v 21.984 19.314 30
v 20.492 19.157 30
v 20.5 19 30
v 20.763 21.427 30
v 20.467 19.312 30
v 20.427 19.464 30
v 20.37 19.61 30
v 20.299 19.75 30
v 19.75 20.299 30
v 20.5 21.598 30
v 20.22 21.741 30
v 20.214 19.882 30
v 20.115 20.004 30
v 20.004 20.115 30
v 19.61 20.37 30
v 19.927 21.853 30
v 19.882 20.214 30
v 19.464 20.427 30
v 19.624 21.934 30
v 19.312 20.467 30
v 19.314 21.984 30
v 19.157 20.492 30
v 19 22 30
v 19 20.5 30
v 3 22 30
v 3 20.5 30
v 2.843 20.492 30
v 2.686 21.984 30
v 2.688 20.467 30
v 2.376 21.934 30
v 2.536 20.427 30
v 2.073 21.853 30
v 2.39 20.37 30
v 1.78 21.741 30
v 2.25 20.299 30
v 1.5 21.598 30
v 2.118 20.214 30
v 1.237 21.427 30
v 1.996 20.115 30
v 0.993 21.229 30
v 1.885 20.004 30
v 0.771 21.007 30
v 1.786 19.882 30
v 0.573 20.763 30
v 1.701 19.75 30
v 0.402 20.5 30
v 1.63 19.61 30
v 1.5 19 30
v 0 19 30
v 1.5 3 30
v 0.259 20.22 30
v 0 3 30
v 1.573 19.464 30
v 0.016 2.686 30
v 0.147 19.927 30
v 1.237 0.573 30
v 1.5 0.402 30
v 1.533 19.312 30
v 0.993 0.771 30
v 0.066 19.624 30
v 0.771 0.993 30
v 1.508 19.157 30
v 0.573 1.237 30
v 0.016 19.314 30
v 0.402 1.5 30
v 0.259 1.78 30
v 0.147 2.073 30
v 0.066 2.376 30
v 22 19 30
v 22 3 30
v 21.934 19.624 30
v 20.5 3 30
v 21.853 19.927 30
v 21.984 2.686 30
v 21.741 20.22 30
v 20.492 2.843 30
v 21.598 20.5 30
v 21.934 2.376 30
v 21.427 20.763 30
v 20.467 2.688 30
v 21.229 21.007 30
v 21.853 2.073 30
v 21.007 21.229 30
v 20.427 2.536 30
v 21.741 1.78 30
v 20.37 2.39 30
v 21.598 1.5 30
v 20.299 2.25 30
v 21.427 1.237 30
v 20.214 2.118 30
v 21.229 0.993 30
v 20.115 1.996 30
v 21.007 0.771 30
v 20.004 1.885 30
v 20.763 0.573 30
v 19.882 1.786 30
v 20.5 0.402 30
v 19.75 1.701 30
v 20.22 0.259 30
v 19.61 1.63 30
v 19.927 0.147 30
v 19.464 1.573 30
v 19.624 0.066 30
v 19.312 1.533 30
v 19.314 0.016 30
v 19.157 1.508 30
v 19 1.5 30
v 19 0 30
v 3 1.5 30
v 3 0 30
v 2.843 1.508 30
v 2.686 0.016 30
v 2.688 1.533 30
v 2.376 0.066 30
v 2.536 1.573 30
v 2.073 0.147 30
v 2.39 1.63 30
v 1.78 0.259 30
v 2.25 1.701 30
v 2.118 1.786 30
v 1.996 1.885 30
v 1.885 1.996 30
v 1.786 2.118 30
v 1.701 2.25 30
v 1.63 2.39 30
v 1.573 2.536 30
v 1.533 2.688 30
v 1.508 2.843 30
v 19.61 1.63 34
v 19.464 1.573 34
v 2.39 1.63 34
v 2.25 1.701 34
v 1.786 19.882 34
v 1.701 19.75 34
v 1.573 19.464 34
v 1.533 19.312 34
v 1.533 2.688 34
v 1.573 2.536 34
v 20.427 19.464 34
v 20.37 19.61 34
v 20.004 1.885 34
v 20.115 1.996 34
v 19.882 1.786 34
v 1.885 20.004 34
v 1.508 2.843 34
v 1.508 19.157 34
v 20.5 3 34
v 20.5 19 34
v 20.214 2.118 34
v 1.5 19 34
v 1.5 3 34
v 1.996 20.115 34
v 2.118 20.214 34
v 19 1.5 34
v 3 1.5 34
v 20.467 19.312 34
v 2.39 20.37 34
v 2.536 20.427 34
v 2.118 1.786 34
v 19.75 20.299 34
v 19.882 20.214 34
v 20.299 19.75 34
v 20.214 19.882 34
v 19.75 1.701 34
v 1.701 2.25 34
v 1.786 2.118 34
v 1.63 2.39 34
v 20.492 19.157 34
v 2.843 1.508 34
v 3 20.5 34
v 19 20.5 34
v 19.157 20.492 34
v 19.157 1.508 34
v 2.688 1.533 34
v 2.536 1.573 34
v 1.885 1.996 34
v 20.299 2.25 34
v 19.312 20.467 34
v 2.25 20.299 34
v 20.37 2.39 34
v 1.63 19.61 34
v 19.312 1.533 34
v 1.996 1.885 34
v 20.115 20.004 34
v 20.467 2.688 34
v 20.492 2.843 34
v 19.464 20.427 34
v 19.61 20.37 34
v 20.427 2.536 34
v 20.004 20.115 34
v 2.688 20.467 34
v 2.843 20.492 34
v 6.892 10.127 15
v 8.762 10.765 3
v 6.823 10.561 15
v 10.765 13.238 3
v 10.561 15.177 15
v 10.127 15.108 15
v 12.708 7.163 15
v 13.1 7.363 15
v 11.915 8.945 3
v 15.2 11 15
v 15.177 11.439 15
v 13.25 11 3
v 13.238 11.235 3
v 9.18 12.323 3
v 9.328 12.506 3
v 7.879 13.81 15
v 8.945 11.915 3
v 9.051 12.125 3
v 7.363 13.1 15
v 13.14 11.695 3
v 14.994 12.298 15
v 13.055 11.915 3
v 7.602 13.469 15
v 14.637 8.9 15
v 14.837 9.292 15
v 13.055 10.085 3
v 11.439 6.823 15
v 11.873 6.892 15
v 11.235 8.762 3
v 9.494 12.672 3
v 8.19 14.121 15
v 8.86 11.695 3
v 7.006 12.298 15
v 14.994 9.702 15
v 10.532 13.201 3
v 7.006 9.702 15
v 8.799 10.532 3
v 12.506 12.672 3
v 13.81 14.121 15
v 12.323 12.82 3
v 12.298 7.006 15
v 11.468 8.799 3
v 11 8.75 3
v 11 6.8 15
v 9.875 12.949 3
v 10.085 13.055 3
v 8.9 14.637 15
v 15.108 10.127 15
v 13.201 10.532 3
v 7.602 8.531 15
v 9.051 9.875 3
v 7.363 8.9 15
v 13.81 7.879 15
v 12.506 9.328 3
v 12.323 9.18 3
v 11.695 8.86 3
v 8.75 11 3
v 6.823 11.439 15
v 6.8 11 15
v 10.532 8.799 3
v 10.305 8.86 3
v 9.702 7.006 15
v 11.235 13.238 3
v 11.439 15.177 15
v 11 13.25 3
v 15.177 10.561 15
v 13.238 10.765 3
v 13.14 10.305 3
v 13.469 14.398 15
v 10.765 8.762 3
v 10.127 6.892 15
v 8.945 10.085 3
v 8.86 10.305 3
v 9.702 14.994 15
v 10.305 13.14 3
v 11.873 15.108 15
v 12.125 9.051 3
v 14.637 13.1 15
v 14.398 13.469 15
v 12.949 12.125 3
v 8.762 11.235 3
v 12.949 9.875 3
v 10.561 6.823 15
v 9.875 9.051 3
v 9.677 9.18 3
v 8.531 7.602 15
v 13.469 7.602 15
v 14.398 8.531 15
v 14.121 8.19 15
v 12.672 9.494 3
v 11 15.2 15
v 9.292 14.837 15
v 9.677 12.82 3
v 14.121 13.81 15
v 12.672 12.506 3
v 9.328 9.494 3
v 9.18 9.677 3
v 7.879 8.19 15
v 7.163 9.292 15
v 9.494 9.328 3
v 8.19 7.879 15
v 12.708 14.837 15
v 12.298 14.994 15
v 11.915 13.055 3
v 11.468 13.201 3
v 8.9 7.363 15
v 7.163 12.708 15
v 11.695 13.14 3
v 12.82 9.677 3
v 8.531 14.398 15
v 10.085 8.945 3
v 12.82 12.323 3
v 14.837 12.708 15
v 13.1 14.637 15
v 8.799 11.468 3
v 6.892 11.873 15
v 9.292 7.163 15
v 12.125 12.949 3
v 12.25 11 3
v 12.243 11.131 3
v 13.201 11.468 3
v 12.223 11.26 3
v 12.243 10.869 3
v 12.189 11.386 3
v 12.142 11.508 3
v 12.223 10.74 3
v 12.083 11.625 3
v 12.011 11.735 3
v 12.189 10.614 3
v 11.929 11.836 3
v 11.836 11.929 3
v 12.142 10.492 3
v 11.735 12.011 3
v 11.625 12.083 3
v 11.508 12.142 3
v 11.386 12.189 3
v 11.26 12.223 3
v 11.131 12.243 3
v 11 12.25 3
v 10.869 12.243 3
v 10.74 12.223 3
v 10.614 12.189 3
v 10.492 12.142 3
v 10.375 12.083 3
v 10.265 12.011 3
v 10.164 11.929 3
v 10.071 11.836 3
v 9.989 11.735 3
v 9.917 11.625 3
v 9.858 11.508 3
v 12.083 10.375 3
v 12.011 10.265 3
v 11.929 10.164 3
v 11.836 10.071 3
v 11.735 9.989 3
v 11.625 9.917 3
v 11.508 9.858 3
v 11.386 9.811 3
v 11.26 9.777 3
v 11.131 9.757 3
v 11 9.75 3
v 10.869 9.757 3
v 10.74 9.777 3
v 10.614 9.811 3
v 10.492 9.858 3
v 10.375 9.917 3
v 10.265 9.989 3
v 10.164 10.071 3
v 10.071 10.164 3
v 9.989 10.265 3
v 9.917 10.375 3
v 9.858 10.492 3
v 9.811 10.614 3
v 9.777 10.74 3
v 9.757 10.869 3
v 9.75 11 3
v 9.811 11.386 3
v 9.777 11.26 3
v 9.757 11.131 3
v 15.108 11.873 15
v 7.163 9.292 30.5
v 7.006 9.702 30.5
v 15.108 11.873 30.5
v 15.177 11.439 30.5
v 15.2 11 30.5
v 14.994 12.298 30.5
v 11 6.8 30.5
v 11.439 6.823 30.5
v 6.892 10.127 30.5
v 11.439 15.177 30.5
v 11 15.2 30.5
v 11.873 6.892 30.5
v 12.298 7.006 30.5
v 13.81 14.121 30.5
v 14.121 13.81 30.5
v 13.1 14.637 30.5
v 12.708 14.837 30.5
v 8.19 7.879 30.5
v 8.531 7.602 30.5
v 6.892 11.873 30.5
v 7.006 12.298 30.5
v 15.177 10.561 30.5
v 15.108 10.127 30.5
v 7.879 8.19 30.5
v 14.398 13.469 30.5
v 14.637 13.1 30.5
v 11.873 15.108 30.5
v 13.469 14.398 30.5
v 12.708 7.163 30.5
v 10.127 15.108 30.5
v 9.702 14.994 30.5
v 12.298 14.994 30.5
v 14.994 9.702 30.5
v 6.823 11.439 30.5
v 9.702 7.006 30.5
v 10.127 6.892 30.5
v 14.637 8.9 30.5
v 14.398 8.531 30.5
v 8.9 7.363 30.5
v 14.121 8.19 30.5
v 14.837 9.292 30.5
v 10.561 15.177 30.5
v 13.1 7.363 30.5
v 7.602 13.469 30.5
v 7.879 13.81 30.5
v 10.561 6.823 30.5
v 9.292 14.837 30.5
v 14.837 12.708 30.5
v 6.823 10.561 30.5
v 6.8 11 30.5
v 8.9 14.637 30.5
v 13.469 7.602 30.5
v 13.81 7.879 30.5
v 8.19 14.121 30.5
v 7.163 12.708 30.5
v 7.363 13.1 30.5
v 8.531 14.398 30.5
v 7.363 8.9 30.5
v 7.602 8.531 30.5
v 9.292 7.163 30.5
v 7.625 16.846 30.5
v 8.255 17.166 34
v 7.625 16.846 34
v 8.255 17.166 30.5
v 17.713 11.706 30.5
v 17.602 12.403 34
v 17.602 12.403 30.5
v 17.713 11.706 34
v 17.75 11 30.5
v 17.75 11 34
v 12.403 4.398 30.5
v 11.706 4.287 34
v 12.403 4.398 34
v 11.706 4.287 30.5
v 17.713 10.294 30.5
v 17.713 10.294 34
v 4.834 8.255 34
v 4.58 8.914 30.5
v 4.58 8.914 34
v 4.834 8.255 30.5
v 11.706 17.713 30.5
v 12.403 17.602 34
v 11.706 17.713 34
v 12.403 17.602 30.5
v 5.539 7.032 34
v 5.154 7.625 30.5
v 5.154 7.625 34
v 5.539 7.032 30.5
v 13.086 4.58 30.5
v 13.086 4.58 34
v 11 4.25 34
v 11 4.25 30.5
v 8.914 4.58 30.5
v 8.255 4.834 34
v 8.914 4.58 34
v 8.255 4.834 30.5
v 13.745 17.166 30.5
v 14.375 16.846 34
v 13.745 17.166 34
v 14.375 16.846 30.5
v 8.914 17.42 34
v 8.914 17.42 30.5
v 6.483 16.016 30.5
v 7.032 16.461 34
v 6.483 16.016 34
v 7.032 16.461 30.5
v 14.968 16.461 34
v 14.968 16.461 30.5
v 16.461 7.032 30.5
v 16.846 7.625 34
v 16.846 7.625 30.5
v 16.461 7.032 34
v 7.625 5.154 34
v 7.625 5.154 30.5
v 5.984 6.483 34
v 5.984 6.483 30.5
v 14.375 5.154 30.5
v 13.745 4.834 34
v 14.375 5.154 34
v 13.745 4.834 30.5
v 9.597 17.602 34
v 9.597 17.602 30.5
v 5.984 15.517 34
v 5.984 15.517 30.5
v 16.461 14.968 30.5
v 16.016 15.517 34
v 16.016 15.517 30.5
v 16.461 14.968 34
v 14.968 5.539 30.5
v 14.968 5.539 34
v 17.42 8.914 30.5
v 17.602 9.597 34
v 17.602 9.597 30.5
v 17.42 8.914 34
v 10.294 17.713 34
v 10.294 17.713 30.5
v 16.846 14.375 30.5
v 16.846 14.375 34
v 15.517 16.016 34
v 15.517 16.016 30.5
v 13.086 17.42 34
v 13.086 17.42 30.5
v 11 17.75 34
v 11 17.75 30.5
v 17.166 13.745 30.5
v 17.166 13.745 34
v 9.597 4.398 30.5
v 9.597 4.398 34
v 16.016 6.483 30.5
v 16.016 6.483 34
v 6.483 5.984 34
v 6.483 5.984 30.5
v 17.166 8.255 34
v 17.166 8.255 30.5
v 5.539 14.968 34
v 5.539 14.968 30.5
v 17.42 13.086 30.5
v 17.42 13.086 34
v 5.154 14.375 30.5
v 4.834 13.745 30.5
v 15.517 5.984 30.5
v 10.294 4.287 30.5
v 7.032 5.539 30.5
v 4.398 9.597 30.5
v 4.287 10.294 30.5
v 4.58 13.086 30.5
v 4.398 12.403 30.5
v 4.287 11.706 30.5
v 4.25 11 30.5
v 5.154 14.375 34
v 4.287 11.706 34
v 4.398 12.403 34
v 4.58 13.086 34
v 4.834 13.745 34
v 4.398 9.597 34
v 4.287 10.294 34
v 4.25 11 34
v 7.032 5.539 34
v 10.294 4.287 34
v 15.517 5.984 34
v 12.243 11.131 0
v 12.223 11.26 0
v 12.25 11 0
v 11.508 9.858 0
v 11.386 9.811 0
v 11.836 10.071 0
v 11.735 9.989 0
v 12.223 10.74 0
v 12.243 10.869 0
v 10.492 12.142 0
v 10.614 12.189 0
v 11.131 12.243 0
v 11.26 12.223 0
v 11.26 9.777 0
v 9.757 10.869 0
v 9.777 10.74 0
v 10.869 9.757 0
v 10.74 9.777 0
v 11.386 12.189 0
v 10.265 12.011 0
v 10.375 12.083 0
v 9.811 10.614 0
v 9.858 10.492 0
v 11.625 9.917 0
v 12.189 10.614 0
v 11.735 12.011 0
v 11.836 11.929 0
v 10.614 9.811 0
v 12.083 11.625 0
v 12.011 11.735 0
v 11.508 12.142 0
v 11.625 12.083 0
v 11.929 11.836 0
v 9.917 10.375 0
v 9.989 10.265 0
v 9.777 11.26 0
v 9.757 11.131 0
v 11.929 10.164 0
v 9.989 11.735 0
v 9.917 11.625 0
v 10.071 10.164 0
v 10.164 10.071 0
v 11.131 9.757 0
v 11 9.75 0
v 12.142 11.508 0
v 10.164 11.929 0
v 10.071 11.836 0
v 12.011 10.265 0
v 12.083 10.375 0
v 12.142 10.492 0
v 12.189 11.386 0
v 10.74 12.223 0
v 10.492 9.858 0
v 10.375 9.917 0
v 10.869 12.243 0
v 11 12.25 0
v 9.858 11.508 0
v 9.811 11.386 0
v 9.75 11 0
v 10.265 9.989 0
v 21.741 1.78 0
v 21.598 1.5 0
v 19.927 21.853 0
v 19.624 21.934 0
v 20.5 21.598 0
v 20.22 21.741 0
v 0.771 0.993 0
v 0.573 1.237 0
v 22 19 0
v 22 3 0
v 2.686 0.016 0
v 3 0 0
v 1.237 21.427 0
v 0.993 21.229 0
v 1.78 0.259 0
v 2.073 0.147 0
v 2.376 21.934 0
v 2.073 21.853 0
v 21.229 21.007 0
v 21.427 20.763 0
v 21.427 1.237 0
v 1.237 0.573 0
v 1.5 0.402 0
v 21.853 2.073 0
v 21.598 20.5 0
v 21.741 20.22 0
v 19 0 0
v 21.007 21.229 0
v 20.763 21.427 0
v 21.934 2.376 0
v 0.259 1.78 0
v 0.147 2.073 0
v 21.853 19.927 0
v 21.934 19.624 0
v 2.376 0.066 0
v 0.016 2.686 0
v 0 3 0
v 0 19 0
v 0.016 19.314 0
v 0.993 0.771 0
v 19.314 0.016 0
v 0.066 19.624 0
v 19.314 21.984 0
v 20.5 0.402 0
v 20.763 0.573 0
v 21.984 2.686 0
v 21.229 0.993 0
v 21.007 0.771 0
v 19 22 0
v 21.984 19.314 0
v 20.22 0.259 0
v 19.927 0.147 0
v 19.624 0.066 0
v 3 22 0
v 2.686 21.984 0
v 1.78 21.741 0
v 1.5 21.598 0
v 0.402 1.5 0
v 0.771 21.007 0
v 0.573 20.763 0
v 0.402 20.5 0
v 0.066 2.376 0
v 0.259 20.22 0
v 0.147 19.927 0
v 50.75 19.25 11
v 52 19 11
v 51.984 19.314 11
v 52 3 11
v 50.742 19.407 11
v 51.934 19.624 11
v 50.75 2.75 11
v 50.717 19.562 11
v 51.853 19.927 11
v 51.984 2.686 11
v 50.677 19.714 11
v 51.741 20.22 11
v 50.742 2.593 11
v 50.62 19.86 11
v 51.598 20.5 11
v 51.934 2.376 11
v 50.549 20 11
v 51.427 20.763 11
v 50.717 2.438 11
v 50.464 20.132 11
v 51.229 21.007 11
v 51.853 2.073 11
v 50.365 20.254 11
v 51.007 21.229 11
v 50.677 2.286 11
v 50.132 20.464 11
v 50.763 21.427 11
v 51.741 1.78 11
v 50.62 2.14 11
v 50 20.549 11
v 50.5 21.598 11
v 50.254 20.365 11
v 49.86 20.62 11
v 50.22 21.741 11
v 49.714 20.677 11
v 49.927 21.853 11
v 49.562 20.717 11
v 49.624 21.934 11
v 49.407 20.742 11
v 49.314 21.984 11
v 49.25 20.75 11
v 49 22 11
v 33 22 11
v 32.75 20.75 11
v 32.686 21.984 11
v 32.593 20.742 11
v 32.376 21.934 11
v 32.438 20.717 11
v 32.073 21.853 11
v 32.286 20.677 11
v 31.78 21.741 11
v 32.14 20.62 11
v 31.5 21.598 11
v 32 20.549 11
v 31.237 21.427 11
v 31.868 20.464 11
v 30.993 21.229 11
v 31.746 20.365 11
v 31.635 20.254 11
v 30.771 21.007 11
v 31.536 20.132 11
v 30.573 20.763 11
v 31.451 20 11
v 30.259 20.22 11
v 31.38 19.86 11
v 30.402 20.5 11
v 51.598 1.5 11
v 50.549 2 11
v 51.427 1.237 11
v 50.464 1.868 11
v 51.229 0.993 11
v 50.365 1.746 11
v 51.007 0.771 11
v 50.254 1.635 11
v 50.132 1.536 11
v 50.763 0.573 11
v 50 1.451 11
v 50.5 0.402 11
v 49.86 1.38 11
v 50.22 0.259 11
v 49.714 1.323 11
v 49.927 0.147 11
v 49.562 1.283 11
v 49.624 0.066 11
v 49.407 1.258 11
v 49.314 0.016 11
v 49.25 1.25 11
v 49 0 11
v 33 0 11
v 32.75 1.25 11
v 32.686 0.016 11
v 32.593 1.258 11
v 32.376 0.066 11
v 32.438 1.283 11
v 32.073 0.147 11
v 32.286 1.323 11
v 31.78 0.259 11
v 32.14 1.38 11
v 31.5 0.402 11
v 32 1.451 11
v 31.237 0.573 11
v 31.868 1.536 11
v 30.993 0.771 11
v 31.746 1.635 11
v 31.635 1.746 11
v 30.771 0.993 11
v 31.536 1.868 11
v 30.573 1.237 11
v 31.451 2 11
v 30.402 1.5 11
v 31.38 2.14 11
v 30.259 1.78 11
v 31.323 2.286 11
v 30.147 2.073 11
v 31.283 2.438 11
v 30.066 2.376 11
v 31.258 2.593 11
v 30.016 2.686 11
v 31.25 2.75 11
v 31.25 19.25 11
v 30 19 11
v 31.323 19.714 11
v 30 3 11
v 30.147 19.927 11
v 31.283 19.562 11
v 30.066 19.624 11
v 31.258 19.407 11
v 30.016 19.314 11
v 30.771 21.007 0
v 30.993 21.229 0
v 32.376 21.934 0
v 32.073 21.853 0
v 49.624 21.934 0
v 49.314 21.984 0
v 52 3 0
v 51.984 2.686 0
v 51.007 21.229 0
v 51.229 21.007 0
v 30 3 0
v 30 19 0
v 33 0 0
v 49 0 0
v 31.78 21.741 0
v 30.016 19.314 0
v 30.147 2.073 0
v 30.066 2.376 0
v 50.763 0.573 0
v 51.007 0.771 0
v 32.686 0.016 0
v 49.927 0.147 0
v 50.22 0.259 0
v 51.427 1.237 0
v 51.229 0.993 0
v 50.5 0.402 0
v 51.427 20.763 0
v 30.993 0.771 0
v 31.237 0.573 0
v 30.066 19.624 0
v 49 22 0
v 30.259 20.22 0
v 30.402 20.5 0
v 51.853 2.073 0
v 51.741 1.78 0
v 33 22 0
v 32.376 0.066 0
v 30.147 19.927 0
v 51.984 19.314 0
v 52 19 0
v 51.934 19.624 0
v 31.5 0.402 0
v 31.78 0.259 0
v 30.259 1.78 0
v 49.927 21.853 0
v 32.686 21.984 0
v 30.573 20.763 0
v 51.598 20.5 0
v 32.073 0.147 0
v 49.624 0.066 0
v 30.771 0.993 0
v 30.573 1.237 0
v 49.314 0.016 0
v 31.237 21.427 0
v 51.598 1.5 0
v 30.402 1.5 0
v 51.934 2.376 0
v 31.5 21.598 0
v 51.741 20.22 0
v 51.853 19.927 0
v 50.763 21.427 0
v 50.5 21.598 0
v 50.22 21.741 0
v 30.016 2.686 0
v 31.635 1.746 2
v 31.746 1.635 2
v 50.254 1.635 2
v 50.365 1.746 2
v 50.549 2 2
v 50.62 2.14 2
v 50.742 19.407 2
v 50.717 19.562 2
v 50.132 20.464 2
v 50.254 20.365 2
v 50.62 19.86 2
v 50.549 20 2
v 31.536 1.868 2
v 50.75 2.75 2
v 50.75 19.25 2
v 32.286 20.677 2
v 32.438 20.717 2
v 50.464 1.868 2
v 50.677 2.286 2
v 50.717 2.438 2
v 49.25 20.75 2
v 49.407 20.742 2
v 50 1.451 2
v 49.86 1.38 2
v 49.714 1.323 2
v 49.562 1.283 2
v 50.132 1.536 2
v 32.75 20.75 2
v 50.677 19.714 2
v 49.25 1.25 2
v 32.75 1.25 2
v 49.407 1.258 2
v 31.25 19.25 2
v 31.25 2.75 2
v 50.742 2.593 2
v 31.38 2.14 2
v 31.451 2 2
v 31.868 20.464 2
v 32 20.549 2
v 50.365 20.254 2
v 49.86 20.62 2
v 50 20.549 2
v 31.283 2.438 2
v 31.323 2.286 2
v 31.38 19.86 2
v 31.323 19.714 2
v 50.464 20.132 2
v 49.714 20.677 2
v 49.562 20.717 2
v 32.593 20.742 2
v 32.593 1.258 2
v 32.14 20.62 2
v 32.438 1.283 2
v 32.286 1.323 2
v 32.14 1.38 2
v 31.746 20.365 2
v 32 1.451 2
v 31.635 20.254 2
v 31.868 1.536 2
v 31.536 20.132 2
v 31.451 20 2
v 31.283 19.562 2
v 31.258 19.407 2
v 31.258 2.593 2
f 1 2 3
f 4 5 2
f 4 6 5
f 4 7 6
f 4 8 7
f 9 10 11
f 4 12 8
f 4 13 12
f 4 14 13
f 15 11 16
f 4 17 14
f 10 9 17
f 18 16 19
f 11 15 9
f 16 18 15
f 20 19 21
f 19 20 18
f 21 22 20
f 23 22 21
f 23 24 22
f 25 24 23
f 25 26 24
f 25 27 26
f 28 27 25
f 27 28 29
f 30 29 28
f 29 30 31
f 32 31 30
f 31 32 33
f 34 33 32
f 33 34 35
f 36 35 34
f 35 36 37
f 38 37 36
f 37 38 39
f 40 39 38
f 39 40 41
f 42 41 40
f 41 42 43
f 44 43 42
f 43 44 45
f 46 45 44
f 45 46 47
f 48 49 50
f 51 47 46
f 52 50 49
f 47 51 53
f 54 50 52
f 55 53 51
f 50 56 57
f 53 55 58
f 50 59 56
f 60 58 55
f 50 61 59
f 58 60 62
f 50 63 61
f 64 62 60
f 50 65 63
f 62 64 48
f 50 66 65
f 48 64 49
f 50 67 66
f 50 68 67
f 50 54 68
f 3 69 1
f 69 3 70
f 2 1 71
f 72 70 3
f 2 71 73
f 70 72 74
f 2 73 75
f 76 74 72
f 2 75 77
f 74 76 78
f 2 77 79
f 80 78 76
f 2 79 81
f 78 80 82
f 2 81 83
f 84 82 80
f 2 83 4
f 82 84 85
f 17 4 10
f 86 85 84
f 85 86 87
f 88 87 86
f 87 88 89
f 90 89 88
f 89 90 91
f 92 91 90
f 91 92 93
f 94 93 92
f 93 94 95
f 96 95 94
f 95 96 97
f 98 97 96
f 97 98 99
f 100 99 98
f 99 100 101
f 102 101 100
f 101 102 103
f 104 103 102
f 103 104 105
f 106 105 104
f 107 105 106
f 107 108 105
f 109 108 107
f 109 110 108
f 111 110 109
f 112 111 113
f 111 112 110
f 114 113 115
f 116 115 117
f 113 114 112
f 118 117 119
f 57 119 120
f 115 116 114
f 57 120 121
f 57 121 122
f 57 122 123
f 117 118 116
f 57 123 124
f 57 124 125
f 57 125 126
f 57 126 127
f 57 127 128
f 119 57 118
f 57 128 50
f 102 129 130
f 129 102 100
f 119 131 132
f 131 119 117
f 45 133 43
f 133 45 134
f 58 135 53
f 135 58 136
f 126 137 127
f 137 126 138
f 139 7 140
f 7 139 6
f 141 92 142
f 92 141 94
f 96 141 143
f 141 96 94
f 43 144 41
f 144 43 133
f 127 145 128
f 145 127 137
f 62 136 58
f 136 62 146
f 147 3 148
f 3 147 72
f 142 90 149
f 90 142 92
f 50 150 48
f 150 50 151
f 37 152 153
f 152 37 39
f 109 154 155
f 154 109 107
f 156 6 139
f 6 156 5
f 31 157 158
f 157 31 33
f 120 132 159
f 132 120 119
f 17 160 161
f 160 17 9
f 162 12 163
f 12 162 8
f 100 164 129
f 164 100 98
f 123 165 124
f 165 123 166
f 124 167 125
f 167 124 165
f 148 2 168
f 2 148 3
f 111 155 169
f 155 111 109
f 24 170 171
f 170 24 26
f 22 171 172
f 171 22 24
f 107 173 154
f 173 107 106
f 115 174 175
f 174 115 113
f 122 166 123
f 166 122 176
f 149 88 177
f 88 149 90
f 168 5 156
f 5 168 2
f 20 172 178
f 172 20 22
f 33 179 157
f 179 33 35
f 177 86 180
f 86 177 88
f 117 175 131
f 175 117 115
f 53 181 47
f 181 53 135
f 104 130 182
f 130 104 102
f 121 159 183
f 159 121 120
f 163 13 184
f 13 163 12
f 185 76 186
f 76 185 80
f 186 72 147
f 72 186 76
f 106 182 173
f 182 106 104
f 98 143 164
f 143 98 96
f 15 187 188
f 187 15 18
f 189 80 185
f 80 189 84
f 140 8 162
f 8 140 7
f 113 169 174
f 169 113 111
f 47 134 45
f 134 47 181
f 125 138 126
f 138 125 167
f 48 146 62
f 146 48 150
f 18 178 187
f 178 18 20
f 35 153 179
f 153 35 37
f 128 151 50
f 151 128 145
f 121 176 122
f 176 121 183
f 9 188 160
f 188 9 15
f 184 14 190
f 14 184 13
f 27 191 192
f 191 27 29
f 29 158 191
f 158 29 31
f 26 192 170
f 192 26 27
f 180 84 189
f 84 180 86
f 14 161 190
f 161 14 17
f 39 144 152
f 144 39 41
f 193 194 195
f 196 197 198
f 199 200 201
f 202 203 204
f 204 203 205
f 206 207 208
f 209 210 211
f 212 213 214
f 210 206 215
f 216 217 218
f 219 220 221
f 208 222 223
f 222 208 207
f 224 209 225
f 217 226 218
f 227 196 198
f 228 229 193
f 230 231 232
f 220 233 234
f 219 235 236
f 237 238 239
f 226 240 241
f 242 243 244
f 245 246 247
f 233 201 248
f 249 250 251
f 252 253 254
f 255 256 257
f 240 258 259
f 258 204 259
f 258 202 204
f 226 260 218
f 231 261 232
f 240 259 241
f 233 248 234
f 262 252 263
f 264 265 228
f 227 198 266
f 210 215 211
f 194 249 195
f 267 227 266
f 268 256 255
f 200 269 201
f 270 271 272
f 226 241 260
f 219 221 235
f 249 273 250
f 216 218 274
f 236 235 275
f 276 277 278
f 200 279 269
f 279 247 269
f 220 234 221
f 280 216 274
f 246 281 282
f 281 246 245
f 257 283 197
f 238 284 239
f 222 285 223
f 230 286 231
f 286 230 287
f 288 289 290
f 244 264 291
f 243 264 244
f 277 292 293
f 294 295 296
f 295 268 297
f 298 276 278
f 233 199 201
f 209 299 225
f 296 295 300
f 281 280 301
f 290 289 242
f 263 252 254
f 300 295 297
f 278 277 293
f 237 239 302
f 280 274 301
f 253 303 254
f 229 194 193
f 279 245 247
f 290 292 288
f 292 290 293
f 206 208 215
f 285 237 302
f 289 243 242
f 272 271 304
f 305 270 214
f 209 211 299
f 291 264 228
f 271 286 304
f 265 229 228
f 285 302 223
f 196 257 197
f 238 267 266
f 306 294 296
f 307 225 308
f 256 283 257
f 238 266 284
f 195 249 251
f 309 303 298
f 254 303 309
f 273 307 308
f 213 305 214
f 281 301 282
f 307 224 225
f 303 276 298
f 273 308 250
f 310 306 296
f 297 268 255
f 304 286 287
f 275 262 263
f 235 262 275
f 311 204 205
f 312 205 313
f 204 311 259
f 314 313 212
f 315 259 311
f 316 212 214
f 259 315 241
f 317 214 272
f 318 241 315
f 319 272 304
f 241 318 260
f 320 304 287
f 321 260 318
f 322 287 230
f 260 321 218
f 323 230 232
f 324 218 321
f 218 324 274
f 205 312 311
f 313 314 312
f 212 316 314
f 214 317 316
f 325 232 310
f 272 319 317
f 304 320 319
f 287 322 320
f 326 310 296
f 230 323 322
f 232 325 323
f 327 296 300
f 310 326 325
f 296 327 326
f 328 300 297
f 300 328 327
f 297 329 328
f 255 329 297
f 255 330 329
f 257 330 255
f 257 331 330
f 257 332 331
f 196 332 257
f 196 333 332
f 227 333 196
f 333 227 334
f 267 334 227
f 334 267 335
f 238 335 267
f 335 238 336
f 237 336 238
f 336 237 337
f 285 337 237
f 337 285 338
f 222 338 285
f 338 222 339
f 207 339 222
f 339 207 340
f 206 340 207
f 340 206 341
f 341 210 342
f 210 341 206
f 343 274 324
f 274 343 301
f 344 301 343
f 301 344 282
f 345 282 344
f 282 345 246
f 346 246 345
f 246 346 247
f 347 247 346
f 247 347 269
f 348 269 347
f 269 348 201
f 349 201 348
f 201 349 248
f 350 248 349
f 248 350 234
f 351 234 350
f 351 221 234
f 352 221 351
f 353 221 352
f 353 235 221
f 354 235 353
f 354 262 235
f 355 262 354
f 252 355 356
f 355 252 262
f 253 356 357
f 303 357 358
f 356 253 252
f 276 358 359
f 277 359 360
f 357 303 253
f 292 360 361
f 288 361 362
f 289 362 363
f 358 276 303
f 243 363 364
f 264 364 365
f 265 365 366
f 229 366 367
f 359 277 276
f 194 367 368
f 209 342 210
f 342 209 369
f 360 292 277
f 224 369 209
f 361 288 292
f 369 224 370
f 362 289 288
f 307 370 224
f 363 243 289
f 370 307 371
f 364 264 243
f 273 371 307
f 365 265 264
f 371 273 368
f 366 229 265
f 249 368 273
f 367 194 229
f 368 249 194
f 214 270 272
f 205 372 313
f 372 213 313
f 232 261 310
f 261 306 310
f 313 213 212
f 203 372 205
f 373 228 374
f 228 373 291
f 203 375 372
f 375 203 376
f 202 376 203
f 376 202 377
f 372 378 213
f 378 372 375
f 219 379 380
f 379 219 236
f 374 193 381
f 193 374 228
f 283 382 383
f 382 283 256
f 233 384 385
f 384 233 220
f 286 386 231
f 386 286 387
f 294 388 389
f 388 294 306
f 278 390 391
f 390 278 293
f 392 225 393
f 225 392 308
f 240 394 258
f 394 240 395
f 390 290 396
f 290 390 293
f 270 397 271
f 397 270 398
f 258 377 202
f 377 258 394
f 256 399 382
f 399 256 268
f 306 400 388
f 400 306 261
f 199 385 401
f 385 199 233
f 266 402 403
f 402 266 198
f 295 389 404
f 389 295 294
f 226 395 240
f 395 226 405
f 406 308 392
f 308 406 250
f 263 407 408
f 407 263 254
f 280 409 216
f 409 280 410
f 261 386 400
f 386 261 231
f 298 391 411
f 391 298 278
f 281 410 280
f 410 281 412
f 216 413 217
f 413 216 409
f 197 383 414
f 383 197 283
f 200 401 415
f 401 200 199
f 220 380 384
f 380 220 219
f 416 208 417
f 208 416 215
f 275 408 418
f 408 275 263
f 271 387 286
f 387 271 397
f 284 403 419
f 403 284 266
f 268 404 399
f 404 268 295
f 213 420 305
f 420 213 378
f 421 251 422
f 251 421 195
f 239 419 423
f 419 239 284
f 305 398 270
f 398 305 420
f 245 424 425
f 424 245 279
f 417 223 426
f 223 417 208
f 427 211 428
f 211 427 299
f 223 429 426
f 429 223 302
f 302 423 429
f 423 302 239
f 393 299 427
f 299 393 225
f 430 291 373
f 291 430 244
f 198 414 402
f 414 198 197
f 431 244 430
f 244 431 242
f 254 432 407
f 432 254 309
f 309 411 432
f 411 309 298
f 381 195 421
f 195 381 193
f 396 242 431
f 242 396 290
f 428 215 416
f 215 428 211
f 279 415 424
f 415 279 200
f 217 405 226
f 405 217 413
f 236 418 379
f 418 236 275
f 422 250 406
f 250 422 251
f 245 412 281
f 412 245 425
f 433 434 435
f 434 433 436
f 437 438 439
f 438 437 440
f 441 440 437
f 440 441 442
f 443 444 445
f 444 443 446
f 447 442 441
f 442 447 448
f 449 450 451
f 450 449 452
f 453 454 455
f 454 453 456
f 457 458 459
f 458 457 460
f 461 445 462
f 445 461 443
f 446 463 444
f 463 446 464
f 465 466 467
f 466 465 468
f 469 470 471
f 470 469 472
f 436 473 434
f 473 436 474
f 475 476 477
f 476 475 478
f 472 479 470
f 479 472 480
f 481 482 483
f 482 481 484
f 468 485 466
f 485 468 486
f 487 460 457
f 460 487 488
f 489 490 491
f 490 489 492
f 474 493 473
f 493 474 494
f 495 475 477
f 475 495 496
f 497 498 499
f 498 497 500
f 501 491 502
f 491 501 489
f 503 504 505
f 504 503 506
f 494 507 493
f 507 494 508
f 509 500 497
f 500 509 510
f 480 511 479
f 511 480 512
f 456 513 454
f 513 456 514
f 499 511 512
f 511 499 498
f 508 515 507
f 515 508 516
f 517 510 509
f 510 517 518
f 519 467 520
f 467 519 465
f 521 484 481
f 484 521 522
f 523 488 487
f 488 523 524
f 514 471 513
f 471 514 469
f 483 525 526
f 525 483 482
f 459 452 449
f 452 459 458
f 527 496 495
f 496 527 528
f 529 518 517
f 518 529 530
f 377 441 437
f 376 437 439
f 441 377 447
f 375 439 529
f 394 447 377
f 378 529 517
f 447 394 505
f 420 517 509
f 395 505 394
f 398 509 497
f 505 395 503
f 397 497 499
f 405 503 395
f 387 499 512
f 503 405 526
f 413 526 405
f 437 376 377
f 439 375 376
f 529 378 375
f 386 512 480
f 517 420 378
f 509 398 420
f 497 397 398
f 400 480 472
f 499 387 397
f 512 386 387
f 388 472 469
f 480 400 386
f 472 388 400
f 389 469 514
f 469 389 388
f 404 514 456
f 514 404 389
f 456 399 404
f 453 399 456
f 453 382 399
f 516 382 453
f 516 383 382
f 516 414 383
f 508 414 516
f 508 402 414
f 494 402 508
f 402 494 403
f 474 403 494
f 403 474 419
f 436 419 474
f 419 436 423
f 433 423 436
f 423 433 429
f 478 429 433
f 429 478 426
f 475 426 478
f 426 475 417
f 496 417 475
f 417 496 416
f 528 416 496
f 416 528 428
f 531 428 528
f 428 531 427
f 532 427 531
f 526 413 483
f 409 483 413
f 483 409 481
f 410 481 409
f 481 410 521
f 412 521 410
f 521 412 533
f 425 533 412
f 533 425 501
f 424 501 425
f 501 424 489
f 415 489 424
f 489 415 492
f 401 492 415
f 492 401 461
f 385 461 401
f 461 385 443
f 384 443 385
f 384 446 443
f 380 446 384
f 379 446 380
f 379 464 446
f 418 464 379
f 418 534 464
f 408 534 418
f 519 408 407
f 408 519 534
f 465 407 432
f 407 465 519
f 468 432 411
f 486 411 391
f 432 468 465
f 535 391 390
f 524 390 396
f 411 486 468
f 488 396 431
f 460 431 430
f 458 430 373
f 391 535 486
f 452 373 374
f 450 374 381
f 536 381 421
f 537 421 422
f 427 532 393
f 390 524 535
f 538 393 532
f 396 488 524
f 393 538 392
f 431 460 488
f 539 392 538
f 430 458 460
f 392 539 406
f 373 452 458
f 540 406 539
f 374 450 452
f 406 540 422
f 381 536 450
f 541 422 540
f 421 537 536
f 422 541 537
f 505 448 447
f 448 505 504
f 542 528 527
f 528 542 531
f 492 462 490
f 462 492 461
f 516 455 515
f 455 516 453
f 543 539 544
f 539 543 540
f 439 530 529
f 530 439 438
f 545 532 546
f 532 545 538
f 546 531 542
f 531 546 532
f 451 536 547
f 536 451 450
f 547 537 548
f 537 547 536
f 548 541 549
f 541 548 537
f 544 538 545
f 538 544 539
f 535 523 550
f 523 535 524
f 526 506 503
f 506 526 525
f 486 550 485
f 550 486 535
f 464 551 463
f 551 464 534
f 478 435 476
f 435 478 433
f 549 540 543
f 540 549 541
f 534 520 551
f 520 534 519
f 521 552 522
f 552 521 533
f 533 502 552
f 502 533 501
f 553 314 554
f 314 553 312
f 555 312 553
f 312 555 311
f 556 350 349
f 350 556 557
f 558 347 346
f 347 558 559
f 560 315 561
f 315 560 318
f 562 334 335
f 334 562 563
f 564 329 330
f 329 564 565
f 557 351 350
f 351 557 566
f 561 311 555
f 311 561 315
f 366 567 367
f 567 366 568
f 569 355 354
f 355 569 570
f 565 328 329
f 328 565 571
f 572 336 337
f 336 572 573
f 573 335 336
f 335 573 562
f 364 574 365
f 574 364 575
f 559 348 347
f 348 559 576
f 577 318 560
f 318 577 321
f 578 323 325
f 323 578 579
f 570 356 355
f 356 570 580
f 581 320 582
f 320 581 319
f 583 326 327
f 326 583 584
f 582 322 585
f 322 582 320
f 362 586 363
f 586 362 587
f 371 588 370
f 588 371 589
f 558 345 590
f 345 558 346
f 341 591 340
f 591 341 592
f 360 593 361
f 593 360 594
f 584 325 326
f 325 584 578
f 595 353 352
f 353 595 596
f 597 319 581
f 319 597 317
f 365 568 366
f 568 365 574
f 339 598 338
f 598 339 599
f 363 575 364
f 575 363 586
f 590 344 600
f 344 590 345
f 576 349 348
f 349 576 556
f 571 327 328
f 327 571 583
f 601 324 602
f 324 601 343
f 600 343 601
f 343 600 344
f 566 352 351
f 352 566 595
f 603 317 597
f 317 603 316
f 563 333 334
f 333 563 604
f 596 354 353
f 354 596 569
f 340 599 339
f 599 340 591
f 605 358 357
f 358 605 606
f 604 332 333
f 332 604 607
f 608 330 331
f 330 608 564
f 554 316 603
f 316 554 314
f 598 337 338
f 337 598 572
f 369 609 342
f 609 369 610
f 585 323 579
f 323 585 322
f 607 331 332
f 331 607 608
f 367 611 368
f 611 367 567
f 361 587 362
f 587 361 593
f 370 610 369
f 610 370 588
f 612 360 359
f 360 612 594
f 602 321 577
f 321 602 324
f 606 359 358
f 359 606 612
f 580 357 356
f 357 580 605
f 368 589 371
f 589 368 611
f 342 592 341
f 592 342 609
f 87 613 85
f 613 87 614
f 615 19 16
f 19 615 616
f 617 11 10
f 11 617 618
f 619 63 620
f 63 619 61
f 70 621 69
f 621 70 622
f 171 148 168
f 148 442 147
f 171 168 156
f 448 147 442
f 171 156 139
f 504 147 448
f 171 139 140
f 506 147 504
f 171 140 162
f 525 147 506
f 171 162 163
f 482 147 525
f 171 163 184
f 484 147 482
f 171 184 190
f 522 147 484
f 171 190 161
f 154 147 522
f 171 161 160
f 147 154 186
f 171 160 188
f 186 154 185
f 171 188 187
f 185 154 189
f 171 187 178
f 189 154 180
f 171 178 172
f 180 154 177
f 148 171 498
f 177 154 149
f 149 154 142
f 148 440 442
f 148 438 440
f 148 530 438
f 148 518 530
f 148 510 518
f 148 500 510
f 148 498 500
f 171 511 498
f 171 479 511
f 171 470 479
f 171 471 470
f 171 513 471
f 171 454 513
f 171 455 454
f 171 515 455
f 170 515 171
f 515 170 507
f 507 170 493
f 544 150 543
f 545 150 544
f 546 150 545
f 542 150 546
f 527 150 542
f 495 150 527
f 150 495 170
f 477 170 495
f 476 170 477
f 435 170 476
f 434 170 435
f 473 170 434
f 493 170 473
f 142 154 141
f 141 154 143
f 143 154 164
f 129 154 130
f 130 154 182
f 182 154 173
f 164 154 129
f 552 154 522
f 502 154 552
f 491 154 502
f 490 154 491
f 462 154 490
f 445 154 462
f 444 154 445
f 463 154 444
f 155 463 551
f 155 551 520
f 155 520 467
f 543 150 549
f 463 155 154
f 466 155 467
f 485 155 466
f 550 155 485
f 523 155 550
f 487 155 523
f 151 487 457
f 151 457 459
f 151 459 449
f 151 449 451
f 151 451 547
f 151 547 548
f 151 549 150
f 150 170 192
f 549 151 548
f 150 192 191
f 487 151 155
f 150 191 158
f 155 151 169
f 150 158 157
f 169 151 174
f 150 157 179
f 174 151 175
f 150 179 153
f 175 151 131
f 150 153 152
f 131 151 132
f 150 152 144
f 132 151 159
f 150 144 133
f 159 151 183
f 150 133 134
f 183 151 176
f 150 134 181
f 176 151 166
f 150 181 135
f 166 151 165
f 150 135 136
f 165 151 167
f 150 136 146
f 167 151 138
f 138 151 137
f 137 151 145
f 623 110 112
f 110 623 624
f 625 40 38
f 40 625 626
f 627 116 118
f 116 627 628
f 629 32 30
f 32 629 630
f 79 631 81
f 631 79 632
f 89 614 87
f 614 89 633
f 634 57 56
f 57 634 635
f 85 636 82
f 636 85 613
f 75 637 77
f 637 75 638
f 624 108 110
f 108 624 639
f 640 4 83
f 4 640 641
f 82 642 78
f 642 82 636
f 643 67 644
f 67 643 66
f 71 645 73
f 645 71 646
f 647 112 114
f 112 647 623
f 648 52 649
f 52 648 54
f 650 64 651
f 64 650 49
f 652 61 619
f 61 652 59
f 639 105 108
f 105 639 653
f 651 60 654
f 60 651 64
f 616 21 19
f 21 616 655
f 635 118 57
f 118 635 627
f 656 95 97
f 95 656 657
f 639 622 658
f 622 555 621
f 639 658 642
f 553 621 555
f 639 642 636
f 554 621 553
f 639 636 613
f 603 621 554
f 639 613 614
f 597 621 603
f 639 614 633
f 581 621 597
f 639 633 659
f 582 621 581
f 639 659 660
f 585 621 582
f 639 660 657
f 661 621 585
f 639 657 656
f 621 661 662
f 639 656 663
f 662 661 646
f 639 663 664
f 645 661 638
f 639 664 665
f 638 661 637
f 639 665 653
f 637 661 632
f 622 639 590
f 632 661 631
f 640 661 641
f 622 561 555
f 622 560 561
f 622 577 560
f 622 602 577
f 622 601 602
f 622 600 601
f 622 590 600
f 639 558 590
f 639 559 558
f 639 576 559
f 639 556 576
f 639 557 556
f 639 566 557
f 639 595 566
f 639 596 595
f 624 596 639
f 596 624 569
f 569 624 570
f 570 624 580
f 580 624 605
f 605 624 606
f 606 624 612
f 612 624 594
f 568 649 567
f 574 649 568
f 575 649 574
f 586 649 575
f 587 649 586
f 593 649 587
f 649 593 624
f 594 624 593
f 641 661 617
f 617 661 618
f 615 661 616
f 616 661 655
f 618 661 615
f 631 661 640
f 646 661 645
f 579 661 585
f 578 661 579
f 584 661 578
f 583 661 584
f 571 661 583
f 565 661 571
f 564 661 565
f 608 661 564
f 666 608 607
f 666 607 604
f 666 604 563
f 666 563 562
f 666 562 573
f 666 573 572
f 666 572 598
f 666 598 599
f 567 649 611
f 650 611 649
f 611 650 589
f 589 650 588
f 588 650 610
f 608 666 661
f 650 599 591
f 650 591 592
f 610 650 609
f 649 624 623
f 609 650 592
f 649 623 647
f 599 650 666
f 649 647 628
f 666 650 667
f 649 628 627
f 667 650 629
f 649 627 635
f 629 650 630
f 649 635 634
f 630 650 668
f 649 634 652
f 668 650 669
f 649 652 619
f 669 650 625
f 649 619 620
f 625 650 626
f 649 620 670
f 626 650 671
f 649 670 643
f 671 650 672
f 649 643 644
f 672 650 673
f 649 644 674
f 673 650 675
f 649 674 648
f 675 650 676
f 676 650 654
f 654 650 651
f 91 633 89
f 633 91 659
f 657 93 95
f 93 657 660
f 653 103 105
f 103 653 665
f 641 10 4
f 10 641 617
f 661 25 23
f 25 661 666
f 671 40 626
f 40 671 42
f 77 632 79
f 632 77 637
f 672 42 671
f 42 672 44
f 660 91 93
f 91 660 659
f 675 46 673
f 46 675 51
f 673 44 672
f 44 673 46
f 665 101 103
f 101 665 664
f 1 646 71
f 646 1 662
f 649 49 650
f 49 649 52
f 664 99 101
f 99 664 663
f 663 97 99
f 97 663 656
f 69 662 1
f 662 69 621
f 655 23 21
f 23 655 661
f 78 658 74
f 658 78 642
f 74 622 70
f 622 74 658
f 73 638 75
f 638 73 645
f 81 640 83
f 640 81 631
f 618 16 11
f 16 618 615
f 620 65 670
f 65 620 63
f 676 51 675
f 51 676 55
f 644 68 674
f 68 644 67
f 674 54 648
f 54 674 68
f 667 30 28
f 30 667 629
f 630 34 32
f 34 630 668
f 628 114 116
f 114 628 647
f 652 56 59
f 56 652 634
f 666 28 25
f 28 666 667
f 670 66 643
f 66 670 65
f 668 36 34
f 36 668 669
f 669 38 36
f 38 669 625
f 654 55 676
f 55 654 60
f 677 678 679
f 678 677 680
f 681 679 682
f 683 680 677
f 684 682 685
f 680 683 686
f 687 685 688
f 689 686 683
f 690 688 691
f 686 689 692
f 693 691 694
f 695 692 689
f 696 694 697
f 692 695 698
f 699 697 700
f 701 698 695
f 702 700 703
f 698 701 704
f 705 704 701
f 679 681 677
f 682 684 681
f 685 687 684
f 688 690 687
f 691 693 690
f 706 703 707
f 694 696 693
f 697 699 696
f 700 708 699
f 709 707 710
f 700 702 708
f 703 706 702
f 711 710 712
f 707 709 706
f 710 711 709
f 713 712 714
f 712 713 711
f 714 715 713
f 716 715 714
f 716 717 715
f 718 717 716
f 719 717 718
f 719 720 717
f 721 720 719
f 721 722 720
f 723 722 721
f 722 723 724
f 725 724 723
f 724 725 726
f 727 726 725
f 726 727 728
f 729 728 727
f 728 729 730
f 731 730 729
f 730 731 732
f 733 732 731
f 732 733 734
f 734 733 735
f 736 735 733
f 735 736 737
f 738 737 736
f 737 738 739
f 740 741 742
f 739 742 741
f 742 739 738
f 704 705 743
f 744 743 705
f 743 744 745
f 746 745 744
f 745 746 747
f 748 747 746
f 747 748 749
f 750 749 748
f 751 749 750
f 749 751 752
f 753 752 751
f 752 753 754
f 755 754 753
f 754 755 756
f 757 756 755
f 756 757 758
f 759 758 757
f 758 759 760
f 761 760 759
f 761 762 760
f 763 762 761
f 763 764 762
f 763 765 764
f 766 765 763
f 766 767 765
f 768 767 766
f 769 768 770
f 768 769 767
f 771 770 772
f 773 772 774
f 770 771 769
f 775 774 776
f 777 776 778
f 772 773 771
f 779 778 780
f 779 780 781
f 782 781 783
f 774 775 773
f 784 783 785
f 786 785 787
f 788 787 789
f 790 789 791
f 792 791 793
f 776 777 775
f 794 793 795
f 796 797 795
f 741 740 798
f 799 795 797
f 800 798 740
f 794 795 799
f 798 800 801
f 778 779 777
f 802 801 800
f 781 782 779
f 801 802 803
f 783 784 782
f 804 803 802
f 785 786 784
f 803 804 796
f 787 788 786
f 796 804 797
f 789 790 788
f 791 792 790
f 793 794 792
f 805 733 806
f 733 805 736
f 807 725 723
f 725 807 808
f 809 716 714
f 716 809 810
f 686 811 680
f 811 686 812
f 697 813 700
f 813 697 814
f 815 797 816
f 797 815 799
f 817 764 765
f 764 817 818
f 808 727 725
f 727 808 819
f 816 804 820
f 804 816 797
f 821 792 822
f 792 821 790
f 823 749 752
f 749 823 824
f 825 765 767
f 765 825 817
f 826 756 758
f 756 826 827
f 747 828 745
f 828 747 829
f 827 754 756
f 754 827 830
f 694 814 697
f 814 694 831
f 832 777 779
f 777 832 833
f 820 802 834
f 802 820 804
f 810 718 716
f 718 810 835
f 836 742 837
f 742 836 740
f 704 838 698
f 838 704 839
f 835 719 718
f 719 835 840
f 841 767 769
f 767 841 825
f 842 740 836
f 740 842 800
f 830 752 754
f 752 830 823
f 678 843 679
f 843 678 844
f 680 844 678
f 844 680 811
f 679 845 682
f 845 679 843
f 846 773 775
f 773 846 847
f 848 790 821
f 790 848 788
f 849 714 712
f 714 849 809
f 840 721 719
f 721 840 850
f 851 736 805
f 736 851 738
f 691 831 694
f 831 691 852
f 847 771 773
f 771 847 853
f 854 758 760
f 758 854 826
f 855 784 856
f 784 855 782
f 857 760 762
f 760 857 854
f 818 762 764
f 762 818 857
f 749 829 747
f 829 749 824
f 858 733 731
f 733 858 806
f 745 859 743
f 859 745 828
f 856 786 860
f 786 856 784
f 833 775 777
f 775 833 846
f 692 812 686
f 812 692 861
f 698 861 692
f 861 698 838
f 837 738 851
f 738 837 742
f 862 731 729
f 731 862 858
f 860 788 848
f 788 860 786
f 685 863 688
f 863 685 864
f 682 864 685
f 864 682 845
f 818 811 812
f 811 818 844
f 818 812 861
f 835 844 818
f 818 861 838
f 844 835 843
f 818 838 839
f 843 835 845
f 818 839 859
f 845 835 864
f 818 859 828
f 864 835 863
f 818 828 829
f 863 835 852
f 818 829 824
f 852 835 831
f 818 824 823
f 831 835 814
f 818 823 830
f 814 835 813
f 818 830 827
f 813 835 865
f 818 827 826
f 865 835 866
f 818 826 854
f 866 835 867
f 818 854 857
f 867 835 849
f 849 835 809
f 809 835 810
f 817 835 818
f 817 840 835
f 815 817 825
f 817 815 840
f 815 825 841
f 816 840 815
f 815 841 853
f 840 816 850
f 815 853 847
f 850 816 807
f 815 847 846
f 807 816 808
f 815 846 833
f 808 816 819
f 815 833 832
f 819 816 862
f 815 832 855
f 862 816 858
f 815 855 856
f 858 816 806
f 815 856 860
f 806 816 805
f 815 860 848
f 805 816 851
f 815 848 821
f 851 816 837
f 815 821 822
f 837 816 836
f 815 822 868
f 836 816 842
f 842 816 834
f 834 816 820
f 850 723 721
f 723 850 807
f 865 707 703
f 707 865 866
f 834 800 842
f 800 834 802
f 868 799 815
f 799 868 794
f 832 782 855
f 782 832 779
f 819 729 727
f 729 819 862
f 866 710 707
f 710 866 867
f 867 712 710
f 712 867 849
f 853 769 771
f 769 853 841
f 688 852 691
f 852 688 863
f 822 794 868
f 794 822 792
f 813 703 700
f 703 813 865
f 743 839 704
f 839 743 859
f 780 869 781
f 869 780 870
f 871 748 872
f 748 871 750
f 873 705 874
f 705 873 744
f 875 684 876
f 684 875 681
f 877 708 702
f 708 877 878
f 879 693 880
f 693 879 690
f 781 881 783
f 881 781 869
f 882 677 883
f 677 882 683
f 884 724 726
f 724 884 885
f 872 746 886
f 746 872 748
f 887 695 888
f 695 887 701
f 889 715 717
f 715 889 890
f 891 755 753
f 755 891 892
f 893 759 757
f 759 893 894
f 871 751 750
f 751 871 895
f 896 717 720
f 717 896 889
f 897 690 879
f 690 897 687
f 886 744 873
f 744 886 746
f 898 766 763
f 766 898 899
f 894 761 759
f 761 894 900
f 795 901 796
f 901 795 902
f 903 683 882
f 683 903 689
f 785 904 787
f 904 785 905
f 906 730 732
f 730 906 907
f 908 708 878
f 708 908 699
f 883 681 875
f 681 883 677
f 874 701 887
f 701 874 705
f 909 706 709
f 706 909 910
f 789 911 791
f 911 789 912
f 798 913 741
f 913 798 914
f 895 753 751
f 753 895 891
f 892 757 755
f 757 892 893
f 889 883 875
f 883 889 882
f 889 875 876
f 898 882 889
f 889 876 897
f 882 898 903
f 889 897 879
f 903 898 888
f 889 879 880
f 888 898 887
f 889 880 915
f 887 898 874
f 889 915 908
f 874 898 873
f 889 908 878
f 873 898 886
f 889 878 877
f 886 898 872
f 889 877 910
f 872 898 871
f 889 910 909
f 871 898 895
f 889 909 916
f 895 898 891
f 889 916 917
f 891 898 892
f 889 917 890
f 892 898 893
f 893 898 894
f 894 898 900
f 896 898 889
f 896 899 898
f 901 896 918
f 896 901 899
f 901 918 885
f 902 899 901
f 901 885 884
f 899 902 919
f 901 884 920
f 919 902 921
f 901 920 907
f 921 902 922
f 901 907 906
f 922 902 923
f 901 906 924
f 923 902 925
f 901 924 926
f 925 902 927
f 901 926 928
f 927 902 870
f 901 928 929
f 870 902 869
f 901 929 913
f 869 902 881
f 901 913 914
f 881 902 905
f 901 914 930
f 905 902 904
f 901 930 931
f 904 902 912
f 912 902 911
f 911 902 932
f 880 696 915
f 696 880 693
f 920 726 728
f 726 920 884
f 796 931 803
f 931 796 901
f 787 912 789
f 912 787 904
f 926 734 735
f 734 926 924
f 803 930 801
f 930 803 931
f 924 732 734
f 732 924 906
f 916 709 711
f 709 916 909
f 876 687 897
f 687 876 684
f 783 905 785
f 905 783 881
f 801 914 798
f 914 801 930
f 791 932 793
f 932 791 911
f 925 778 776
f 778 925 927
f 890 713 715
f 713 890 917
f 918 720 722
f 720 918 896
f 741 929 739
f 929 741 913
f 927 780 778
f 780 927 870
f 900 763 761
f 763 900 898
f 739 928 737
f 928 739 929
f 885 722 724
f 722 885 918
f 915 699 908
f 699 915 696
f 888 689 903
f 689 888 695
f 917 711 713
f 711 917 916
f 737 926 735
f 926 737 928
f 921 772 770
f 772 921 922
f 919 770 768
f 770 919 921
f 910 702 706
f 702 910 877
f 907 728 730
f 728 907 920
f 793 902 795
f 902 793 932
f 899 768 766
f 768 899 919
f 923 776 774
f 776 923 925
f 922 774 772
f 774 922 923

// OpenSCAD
/* =========================================================
   Caja / Contenedor Individual para Microtubo de 0.5 mL
   (Base + Tapa incluida)
   ========================================================= */

$fn = 60; // Suavizado de círculos

// --- Dimensiones del microtubo (con holguras de impresión) ---
tube_body_dia    = 8.4;   // Diámetro superior del cuerpo cilíndrico (mm)
cone_tip_dia     = 4.5;   // Diámetro en la base del cono inferior (mm)
cone_height      = 12.0;  // Altura de la sección cónica (mm)
cylinder_height  = 16.0;  // Altura del cuerpo recto superior (mm)

rim_dia          = 13.5;  // Diámetro exterior del borde/anillo superior (mm)
rim_depth        = 3.5;   // Profundidad para el borde y bisagra de la tapa (mm)

// --- Dimensiones de la caja exterior ---
wall_thickness   = 3.5;   // Grosor de pared
base_size        = 22.0;  // Ancho y largo exterior (mm)
base_height      = 34.0;  // Altura total de la base (mm)
corner_radius    = 3.0;   // Redondeo de las esquinas exteriores (mm)

// --- Ajuste de la tapa ---
lip_height       = 4.0;   // Altura del rebaje donde calza la tapa (mm)
lip_inset        = 1.5;   // Espesor del labio de ajuste (mm)
lid_tolerance    = 0.25;  // Holgura entre base y tapa para un calce suave (mm)
lid_inner_h      = 5.0;   // Altura interna de la tapa para cubrir la cabeza (mm)

// --- Renderizado en el espacio de trabajo ---
// Muestra la base y la tapa una al lado de la otra listas para imprimir:
caja_base();

translate([base_size + 8, 0, 0])
    caja_tapa();


// ==================== MÓDULOS ====================

// 1. BASE DEL CONTENEDOR
module caja_base() {
    difference() {
        // Bloque exterior
        rounded_cube([base_size, base_size, base_height], corner_radius);

        // Rebaje exterior superior (labio de acople para la tapa)
        translate([0, 0, base_height - lip_height])
            difference() {
                translate([-1, -1, 0]) 
                    cube([base_size + 2, base_size + 2, lip_height + 1]);
                
                translate([lip_inset, lip_inset, -1])
                    rounded_cube([base_size - 2*lip_inset, base_size - 2*lip_inset, lip_height + 2], max(1, corner_radius - lip_inset));
            }

        // Cavidad interior del tubo (centrada)
        translate([base_size/2, base_size/2, 0]) {
            // Fondo cónico (inicia a 3mm del suelo para buen grosor de base)
            translate([0, 0, 3.0])
                cylinder(h = cone_height, d1 = cone_tip_dia, d2 = tube_body_dia);

            // Cilindro recto
            translate([0, 0, 3.0 + cone_height])
                cylinder(h = cylinder_height + 0.1, d = tube_body_dia);

            // Alojamiento del labio superior y bisagra
            translate([0, 0, base_height - rim_depth])
                cylinder(h = rim_depth + 1, d = rim_dia);

            // Orificio pasante en la base (para drenaje o expulsar con clip/aguja si se traba)
            translate([0, 0, -1])
                cylinder(h = 5, d = 2.5);
        }
    }
}

// 2. TAPA PROTECTORA
module caja_tapa() {
    lid_wall = 2.0;
    lid_total_h = lip_height + lid_inner_h + lid_wall;

    difference() {
        // Exterior idéntico al perfil de la base
        rounded_cube([base_size, base_size, lid_total_h], corner_radius);

        // Hueco interior para encajar sobre el labio de la base
        translate([lip_inset - lid_tolerance, lip_inset - lid_tolerance, lid_wall])
            rounded_cube([
                base_size - 2*(lip_inset - lid_tolerance), 
                base_size - 2*(lip_inset - lid_tolerance), 
                lid_total_h + 1
            ], max(1, corner_radius - lip_inset));
    }
}

// 3. CUBO REDONDEADO AUXILIAR
module rounded_cube(size, r) {
    x = size[0];
    y = size[1];
    z = size[2];
    hull() {
        translate([r, r, 0])         cylinder(h = z, r = r);
        translate([x - r, r, 0])     cylinder(h = z, r = r);
        translate([r, y - r, 0])     cylinder(h = z, r = r);
        translate([x - r, y - r, 0]) cylinder(h = z, r = r);
    }
}
